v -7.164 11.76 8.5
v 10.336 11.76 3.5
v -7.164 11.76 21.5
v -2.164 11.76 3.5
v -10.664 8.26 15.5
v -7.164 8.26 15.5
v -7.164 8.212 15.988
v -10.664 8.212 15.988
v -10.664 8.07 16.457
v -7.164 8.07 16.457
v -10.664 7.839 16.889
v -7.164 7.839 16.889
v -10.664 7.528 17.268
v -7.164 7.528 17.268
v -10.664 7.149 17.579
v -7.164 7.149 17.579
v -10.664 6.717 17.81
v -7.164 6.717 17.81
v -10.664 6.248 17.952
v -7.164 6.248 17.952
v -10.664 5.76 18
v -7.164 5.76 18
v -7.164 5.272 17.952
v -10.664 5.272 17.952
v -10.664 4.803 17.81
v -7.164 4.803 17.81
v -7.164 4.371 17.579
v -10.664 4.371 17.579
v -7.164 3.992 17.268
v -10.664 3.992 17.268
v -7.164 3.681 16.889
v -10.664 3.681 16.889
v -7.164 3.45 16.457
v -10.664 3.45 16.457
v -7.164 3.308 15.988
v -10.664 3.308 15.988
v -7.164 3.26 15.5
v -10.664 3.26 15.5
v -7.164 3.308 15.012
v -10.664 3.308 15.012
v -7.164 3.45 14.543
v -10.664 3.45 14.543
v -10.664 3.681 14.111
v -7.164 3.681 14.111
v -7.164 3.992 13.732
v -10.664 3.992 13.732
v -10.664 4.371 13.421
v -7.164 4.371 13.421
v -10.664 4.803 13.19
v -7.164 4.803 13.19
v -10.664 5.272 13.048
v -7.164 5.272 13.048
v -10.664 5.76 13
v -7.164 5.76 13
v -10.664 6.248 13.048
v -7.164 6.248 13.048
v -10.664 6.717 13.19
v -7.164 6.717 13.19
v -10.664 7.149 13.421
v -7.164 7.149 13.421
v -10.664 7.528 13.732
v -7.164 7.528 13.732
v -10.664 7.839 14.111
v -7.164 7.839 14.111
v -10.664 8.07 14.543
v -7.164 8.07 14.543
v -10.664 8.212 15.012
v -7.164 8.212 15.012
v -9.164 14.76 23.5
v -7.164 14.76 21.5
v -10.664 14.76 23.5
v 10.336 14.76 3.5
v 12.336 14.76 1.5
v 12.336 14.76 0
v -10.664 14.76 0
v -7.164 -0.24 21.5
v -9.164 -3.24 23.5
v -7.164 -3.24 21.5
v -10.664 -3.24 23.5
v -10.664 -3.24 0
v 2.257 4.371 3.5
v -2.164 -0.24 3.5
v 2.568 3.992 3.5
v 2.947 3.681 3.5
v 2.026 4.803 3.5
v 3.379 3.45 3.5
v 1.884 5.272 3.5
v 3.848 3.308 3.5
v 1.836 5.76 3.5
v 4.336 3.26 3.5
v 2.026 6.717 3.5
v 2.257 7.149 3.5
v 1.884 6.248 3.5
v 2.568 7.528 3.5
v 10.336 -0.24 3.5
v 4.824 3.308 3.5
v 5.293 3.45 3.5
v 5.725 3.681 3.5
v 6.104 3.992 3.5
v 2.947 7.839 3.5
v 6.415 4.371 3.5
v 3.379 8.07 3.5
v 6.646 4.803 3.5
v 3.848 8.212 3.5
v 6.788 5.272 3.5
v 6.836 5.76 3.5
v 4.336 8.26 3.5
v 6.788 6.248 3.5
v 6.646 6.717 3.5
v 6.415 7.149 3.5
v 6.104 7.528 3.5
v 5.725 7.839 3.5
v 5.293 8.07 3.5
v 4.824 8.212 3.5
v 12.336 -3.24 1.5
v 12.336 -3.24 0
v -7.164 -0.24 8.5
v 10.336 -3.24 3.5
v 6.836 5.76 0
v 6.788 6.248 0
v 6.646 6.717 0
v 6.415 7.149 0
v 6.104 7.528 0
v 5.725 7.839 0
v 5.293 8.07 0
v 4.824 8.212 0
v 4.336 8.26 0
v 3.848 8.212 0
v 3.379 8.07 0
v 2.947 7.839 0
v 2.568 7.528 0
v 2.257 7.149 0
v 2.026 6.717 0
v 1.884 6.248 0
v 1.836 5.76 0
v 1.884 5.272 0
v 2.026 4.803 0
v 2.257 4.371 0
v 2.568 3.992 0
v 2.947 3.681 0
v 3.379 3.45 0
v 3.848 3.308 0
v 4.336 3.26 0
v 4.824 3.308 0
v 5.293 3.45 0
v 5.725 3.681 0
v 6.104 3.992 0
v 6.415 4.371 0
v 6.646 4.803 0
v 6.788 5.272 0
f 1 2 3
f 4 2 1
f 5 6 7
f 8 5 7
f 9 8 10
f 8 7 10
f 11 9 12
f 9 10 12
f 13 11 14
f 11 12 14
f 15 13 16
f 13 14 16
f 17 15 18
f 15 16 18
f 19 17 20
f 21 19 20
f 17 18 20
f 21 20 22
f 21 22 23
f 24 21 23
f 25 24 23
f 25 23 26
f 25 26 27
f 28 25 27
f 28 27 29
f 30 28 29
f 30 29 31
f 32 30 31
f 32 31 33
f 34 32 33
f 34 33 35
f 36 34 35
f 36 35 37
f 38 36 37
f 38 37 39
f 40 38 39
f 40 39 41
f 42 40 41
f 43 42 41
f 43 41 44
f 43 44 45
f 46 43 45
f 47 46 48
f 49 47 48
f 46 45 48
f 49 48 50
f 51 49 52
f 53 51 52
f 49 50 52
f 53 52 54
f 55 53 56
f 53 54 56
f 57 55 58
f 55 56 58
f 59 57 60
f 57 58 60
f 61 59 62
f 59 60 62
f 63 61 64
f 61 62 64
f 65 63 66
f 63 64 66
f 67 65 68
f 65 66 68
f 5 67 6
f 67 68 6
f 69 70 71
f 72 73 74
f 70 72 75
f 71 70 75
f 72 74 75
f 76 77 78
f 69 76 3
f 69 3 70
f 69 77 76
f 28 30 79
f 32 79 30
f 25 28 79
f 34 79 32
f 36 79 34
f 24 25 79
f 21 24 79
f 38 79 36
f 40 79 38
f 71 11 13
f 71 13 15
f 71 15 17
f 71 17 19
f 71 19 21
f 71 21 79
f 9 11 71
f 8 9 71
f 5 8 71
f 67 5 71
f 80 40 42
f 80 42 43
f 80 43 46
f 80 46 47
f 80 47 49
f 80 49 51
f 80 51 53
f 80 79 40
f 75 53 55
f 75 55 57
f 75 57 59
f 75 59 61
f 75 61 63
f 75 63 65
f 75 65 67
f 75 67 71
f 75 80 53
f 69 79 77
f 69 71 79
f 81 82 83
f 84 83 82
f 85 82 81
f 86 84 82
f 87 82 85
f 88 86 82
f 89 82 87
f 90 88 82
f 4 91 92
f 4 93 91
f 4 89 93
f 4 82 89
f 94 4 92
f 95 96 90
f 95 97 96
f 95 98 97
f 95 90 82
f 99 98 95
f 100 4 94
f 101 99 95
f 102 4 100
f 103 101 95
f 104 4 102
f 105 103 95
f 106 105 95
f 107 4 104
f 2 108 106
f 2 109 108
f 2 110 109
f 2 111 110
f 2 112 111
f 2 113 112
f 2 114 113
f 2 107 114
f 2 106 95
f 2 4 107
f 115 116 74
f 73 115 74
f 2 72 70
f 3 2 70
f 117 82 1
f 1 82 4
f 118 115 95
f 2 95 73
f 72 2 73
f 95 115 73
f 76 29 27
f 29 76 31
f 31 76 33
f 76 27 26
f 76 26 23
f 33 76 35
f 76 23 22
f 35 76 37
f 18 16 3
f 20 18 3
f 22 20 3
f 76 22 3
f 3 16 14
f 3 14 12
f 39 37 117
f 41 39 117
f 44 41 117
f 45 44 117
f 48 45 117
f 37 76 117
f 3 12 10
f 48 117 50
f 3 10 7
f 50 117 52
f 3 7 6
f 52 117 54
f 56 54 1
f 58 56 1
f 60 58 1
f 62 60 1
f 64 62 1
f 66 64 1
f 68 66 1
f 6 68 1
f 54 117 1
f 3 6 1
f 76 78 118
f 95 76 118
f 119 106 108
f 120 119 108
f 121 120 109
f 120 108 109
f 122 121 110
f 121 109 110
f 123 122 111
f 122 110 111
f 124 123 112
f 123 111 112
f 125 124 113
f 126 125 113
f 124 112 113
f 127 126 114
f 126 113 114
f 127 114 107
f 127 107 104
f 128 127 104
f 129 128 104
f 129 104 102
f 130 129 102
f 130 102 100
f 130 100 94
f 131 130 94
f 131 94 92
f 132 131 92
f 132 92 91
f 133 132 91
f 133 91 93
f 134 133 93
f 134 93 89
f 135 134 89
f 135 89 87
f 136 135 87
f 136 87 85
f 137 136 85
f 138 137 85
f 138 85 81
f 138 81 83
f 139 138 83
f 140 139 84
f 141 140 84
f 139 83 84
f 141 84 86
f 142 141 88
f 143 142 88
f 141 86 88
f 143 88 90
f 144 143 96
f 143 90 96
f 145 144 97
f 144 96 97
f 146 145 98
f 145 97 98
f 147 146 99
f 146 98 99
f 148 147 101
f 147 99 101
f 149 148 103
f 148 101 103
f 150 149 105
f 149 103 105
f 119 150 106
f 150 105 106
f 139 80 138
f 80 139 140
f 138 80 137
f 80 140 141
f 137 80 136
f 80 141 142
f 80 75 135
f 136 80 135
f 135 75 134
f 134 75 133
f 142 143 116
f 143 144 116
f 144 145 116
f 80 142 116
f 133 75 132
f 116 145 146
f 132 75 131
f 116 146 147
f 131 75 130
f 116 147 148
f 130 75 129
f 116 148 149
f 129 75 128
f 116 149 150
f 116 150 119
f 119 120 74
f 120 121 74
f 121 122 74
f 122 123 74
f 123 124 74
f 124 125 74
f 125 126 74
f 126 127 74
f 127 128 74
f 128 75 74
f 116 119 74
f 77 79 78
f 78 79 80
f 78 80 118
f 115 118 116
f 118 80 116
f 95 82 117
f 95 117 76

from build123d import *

# Parameters (mm, degrees)
ESQUISSE1_W             = 23
ESQUISSE1_H             = 18
BOSS_EXTRU_1_DEPTH      = 3.5
ESQUISSE2_W             = 3.5
ESQUISSE2_H             = 18
BOSS_EXTRU_2_DEPTH      = 20
ESQUISSE3_R             = 2.5
ENL_V_MAT_EXTRU_1_DEPTH = 20
ESQUISSE4_R             = 2.5
ENL_V_MAT_EXTRU_2_DEPTH = 20
CHANFREIN1_SIZE         = 5
CHANFREIN2_SIZE         = 2
BOSS_EXTRU_3_DEPTH      = 3
BOSS_EXTRU_4_DEPTH      = 3


with BuildPart() as part:
    # Esquisse1 → Boss.-Extru.1 (new body)
    with BuildSketch(Plane.XY):
        with Locations((0.836143498, 5.76)):
            Rectangle(ESQUISSE1_W, ESQUISSE1_H)
    extrude(amount=BOSS_EXTRU_1_DEPTH)

    # Esquisse2 → Boss.-Extru.2 (add)
    with BuildSketch(Plane.XY.offset(3.5)):
        with Locations((-8.913856502, 5.76)):
            Rectangle(ESQUISSE2_W, ESQUISSE2_H)
    extrude(amount=BOSS_EXTRU_2_DEPTH)

    # Esquisse3 → Enlèv. mat.-Extru.1 (cut)
    with BuildSketch(Plane.XY.offset(3.5)):
        with Locations((4.336143498, 5.76)):
            Circle(ESQUISSE3_R)
    extrude(amount=-ENL_V_MAT_EXTRU_1_DEPTH, mode=Mode.SUBTRACT)

    # Esquisse4 → Enlèv. mat.-Extru.2 (cut)
    with BuildSketch(Plane(origin=(-7.163856502, 0, 0), x_dir=(0, 0, -1), z_dir=(1, 0, 0))):
        with Locations(Location((-15.5, 5.76, 0), (0, 0, 90))):
            Circle(ESQUISSE4_R)
    extrude(amount=-ENL_V_MAT_EXTRU_2_DEPTH, mode=Mode.SUBTRACT)

    # Chanfrein1
    chanfrein1_edges = [part.edges().sort_by_distance(p)[0] for p in [
        (-7.163856502, 5.76, 3.5),
    ]]
    chamfer(chanfrein1_edges, length=CHANFREIN1_SIZE)

    # Chanfrein2
    chanfrein2_edges = [part.edges().sort_by_distance(p)[0] for p in [
        (12.336143498, 5.76, 3.5),
        (-7.163856502, 5.76, 23.5),
    ]]
    chamfer(chanfrein2_edges, length=CHANFREIN2_SIZE)

    # Esquisse5 → Boss.-Extru.3 (add)
    with BuildSketch(Plane(origin=(0, 14.76, 0), x_dir=(1, 0, 0), z_dir=(0, 1, 0))):
        Polygon((10.336143498, -3.5), (-7.163856502, -21.5), (-7.163856502, -8.5), (-2.163856502, -3.5), align=None)
    extrude(amount=-BOSS_EXTRU_3_DEPTH)

    # Esquisse6 → Boss.-Extru.4 (add)
    with BuildSketch(Plane(origin=(0, -3.24, 0), x_dir=(-1, 0, 0), z_dir=(0, -1, 0))):
        Polygon((7.163856502, -21.5), (-10.336143498, -3.5), (2.163856502, -3.5), (7.163856502, -8.5), align=None)
    extrude(amount=-BOSS_EXTRU_4_DEPTH)


solid = part.part
